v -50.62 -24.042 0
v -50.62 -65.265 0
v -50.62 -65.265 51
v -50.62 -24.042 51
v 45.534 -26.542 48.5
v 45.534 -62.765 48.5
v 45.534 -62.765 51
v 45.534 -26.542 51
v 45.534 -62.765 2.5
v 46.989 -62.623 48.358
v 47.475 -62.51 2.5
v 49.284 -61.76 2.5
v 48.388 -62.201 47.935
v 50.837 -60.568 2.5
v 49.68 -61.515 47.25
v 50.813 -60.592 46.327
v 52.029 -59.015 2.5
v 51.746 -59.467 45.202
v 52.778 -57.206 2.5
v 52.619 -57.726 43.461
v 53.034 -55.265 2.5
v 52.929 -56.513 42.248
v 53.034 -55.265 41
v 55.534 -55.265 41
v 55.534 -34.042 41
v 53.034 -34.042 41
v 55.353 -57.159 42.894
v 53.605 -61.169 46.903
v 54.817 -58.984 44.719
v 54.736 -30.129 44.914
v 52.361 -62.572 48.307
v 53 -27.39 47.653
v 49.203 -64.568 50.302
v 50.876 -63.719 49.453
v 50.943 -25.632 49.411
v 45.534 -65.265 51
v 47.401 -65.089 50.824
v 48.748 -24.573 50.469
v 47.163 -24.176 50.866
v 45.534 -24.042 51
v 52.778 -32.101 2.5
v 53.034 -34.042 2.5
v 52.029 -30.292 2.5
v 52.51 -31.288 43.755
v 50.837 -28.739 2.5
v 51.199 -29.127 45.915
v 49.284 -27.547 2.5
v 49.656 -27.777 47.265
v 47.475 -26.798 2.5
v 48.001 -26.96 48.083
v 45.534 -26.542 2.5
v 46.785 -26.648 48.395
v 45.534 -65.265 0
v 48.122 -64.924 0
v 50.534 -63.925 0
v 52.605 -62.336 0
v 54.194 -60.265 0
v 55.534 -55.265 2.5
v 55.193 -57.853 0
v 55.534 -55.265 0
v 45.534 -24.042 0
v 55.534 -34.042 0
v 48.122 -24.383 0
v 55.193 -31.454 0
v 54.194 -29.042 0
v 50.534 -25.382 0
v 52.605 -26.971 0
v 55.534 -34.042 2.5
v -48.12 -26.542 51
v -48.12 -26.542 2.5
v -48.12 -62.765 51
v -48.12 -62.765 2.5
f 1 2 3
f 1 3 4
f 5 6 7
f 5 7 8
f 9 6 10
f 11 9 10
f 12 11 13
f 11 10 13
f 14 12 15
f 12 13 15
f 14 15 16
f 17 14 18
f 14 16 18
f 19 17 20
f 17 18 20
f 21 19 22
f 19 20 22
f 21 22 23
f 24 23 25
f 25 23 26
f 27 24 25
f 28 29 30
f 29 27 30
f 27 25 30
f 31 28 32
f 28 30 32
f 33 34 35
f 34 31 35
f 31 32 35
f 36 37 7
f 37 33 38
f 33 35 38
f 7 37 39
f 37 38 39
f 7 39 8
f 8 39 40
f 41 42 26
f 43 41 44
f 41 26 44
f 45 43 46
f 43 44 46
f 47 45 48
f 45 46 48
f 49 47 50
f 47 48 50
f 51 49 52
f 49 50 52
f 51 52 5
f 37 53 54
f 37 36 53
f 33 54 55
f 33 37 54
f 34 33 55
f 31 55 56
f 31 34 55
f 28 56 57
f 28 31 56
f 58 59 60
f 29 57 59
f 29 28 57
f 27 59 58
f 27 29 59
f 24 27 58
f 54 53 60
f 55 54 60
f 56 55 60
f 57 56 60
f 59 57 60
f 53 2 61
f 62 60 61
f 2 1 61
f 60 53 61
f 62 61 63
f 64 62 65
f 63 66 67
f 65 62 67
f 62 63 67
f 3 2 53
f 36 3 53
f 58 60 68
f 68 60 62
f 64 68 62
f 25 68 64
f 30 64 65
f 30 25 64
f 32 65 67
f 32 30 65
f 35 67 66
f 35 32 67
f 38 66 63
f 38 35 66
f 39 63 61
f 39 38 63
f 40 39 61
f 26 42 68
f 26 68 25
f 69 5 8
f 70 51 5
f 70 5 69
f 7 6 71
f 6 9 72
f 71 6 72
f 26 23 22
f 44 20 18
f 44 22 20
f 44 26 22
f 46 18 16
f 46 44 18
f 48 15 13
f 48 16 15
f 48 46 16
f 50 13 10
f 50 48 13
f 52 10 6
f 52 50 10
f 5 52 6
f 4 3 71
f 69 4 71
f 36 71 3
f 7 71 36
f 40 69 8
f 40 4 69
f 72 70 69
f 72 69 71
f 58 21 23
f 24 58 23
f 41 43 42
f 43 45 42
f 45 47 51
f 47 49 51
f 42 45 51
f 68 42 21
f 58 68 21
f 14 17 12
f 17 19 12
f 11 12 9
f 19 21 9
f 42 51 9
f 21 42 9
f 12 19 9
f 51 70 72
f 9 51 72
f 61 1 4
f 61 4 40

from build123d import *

# Parameters (mm, degrees)
F0_W     = 106.154050678
F0_H     = 41.2226635963
F1_DEPTH = 51
F2_R     = 10
F3_T     = -2.5


# Not quite as in the source:
# - a shell that OpenCascade refuses in one call is made with other operations: the cavity is built on its own and cut out


with BuildPart() as f1:
    # F0 (on Top) → F1 (new body)
    with BuildSketch(Plane.XY):
        with Locations((2.456812188, -44.6538021788)):
            Rectangle(F0_W, F0_H)
    extrude(amount=F1_DEPTH)

    # F2
    f2_edges = [f1.edges().sort_by_distance(p)[0] for p in [
        (55.533838, -65.265134, 25.5),
        (55.533838, -24.04247, 25.5),
        (55.533838, -44.653802, 51),
    ]]
    fillet(f2_edges, radius=F2_R)

    # F3: a shell. OpenCascade refuses it in one call, so the cavity is built on its own and cut out:
    # the body offset inwards by the wall thickness, plus a prism from it out through each open face.
    f3_core = offset(f1.part, amount=F3_T, mode=Mode.PRIVATE)
    f3_exits = [f3_core.faces().sort_by_distance(p)[0] for p in [
        (-1.293188, -44.653802, 48.5),
        (53.033838, -44.653802, 21.75),
    ]]
    add(f3_core, mode=Mode.SUBTRACT)
    extrude(f3_exits, amount=-F3_T, mode=Mode.SUBTRACT)


solid = f1.part
